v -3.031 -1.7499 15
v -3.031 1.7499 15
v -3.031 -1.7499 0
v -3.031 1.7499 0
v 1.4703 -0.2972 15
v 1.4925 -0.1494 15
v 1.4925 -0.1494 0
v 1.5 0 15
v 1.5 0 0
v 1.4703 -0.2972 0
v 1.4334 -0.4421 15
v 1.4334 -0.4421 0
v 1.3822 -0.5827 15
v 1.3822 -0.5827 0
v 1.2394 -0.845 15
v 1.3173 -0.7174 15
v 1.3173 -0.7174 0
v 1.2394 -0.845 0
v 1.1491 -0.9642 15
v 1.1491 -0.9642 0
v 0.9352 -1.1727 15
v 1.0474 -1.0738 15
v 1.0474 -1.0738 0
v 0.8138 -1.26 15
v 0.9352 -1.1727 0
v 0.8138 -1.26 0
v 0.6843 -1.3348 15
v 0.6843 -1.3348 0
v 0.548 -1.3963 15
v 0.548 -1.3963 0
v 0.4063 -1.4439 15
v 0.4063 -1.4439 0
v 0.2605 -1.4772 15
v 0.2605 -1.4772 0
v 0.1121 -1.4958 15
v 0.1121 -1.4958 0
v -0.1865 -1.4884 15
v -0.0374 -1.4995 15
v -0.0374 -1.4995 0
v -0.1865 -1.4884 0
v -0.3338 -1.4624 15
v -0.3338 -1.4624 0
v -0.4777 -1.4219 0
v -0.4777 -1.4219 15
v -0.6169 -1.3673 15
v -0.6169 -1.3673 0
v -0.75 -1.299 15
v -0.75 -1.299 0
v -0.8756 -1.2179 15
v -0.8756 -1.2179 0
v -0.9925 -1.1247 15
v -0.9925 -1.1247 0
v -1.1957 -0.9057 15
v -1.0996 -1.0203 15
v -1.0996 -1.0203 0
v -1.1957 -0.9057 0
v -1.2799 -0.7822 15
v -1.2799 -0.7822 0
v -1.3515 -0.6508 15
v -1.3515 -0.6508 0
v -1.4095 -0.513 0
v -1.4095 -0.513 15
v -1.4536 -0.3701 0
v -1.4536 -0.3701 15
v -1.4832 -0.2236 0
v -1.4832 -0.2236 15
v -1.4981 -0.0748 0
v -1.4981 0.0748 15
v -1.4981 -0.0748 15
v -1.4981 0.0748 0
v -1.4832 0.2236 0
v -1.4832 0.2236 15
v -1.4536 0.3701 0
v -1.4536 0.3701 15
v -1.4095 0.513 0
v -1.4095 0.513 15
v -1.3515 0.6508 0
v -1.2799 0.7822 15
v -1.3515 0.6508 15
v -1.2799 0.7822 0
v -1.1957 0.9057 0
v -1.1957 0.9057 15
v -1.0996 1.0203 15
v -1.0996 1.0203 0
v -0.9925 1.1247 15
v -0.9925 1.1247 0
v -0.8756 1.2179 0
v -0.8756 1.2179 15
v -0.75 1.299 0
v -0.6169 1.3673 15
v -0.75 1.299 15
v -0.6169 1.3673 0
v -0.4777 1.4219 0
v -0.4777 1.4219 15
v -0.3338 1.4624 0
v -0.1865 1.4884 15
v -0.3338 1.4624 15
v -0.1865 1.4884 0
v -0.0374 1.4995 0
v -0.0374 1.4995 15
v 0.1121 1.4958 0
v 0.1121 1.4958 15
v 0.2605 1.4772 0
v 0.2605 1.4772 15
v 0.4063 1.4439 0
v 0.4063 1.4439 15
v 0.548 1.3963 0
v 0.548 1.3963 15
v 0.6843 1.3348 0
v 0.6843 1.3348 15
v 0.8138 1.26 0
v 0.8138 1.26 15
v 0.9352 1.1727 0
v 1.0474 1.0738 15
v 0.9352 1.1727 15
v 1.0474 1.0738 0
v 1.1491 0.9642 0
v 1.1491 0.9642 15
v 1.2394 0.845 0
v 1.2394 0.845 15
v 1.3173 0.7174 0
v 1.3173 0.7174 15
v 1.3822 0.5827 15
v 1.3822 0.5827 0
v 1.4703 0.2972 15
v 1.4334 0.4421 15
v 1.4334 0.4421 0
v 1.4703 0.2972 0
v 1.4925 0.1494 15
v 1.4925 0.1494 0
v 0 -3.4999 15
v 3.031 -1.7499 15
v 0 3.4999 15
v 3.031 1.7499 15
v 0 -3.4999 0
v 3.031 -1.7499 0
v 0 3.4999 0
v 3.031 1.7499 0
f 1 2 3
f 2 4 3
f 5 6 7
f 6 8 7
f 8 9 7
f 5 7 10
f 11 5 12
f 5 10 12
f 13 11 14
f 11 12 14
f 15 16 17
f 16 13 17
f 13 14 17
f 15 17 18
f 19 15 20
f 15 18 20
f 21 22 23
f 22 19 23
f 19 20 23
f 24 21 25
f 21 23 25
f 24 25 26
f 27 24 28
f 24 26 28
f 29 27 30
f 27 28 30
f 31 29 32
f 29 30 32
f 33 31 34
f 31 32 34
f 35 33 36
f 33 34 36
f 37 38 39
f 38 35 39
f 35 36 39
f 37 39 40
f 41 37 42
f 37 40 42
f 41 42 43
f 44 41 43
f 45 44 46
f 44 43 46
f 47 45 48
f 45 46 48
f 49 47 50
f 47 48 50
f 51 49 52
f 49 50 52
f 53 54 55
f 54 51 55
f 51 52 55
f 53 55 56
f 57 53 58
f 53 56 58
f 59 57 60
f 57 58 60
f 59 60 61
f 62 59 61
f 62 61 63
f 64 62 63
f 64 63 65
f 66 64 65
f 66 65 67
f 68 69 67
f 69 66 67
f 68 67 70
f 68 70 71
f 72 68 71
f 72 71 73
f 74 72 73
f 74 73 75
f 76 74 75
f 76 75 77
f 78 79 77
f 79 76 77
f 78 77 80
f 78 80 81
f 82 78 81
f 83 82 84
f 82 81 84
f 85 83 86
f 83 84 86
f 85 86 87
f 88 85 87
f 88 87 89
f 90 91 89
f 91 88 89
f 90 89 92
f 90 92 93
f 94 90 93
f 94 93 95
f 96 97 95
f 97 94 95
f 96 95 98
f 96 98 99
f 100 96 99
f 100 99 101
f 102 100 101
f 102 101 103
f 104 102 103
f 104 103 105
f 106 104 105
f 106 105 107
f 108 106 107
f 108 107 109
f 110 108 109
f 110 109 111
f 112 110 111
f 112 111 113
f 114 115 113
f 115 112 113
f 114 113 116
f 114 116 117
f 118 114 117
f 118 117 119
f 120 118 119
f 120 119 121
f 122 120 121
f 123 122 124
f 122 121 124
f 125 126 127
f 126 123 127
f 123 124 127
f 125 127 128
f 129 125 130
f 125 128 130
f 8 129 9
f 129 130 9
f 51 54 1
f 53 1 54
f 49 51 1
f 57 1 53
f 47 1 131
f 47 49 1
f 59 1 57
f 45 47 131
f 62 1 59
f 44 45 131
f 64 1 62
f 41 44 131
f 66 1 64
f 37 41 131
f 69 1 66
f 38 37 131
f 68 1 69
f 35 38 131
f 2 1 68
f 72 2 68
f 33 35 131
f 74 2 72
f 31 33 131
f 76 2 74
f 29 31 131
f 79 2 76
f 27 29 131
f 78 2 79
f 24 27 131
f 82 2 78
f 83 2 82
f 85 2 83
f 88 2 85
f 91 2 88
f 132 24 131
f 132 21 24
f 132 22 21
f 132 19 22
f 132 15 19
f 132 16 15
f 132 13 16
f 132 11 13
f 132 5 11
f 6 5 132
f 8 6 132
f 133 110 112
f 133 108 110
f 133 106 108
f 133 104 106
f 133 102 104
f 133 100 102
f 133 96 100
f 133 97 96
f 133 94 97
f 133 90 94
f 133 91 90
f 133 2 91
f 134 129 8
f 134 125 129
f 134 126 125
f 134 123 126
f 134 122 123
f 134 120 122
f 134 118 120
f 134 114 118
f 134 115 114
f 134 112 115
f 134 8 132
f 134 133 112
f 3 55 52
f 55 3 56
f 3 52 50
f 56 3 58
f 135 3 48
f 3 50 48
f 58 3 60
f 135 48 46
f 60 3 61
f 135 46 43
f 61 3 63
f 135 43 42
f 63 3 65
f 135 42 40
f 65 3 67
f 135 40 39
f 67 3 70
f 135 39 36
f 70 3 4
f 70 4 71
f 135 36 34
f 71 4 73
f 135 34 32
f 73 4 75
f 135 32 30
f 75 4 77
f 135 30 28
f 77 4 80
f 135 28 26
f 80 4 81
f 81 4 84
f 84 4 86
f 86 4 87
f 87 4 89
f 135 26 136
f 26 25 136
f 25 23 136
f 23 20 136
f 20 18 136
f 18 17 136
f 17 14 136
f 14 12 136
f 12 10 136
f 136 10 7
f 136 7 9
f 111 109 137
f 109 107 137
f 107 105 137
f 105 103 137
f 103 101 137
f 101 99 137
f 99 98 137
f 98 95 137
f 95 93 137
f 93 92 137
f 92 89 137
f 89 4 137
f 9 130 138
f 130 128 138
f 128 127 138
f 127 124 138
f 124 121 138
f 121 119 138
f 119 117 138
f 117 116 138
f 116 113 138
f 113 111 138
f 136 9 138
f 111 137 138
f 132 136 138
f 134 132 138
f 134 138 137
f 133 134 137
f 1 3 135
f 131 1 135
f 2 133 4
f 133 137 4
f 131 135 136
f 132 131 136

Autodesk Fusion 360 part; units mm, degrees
sketch "スケッチ1" plane through (0, 0, 0) normal (0, 0, 1) x (1, 0, 0)
  line L0 (3.5241, 6.0479) -> (-3.4756, 6.076)
  line L1 (-3.4756, 6.076) -> (-6.9997, 0.028)
  line L2 (-6.9997, 0.028) -> (-3.5241, -6.0479)
  line L3 (-3.5241, -6.0479) -> (3.4756, -6.076)
  line L4 (3.4756, -6.076) -> (6.9997, -0.028)
  line L5 (6.9997, -0.028) -> (3.5241, 6.0479)
  circle A0 centre (0, 0) radius 1.5
  line L6 (3.031, 1.7499) -> (0, 3.4999)
  line L7 (0, 3.4999) -> (-3.031, 1.7499)
  line L8 (-3.031, 1.7499) -> (-3.031, -1.7499)
  line L9 (-3.031, -1.7499) -> (0, -3.4999)
  line L10 (0, -3.4999) -> (3.031, -1.7499)
  line L11 (3.031, -1.7499) -> (3.031, 1.7499)
  dimension "d1" = 6.062
  dimension "d2" = 3
  dimension "d3" = 3.031
extrude "押し出し1" add sketch "スケッチ1" along normal blind 15 contours L6 L7 L8 L9 L10 L11
